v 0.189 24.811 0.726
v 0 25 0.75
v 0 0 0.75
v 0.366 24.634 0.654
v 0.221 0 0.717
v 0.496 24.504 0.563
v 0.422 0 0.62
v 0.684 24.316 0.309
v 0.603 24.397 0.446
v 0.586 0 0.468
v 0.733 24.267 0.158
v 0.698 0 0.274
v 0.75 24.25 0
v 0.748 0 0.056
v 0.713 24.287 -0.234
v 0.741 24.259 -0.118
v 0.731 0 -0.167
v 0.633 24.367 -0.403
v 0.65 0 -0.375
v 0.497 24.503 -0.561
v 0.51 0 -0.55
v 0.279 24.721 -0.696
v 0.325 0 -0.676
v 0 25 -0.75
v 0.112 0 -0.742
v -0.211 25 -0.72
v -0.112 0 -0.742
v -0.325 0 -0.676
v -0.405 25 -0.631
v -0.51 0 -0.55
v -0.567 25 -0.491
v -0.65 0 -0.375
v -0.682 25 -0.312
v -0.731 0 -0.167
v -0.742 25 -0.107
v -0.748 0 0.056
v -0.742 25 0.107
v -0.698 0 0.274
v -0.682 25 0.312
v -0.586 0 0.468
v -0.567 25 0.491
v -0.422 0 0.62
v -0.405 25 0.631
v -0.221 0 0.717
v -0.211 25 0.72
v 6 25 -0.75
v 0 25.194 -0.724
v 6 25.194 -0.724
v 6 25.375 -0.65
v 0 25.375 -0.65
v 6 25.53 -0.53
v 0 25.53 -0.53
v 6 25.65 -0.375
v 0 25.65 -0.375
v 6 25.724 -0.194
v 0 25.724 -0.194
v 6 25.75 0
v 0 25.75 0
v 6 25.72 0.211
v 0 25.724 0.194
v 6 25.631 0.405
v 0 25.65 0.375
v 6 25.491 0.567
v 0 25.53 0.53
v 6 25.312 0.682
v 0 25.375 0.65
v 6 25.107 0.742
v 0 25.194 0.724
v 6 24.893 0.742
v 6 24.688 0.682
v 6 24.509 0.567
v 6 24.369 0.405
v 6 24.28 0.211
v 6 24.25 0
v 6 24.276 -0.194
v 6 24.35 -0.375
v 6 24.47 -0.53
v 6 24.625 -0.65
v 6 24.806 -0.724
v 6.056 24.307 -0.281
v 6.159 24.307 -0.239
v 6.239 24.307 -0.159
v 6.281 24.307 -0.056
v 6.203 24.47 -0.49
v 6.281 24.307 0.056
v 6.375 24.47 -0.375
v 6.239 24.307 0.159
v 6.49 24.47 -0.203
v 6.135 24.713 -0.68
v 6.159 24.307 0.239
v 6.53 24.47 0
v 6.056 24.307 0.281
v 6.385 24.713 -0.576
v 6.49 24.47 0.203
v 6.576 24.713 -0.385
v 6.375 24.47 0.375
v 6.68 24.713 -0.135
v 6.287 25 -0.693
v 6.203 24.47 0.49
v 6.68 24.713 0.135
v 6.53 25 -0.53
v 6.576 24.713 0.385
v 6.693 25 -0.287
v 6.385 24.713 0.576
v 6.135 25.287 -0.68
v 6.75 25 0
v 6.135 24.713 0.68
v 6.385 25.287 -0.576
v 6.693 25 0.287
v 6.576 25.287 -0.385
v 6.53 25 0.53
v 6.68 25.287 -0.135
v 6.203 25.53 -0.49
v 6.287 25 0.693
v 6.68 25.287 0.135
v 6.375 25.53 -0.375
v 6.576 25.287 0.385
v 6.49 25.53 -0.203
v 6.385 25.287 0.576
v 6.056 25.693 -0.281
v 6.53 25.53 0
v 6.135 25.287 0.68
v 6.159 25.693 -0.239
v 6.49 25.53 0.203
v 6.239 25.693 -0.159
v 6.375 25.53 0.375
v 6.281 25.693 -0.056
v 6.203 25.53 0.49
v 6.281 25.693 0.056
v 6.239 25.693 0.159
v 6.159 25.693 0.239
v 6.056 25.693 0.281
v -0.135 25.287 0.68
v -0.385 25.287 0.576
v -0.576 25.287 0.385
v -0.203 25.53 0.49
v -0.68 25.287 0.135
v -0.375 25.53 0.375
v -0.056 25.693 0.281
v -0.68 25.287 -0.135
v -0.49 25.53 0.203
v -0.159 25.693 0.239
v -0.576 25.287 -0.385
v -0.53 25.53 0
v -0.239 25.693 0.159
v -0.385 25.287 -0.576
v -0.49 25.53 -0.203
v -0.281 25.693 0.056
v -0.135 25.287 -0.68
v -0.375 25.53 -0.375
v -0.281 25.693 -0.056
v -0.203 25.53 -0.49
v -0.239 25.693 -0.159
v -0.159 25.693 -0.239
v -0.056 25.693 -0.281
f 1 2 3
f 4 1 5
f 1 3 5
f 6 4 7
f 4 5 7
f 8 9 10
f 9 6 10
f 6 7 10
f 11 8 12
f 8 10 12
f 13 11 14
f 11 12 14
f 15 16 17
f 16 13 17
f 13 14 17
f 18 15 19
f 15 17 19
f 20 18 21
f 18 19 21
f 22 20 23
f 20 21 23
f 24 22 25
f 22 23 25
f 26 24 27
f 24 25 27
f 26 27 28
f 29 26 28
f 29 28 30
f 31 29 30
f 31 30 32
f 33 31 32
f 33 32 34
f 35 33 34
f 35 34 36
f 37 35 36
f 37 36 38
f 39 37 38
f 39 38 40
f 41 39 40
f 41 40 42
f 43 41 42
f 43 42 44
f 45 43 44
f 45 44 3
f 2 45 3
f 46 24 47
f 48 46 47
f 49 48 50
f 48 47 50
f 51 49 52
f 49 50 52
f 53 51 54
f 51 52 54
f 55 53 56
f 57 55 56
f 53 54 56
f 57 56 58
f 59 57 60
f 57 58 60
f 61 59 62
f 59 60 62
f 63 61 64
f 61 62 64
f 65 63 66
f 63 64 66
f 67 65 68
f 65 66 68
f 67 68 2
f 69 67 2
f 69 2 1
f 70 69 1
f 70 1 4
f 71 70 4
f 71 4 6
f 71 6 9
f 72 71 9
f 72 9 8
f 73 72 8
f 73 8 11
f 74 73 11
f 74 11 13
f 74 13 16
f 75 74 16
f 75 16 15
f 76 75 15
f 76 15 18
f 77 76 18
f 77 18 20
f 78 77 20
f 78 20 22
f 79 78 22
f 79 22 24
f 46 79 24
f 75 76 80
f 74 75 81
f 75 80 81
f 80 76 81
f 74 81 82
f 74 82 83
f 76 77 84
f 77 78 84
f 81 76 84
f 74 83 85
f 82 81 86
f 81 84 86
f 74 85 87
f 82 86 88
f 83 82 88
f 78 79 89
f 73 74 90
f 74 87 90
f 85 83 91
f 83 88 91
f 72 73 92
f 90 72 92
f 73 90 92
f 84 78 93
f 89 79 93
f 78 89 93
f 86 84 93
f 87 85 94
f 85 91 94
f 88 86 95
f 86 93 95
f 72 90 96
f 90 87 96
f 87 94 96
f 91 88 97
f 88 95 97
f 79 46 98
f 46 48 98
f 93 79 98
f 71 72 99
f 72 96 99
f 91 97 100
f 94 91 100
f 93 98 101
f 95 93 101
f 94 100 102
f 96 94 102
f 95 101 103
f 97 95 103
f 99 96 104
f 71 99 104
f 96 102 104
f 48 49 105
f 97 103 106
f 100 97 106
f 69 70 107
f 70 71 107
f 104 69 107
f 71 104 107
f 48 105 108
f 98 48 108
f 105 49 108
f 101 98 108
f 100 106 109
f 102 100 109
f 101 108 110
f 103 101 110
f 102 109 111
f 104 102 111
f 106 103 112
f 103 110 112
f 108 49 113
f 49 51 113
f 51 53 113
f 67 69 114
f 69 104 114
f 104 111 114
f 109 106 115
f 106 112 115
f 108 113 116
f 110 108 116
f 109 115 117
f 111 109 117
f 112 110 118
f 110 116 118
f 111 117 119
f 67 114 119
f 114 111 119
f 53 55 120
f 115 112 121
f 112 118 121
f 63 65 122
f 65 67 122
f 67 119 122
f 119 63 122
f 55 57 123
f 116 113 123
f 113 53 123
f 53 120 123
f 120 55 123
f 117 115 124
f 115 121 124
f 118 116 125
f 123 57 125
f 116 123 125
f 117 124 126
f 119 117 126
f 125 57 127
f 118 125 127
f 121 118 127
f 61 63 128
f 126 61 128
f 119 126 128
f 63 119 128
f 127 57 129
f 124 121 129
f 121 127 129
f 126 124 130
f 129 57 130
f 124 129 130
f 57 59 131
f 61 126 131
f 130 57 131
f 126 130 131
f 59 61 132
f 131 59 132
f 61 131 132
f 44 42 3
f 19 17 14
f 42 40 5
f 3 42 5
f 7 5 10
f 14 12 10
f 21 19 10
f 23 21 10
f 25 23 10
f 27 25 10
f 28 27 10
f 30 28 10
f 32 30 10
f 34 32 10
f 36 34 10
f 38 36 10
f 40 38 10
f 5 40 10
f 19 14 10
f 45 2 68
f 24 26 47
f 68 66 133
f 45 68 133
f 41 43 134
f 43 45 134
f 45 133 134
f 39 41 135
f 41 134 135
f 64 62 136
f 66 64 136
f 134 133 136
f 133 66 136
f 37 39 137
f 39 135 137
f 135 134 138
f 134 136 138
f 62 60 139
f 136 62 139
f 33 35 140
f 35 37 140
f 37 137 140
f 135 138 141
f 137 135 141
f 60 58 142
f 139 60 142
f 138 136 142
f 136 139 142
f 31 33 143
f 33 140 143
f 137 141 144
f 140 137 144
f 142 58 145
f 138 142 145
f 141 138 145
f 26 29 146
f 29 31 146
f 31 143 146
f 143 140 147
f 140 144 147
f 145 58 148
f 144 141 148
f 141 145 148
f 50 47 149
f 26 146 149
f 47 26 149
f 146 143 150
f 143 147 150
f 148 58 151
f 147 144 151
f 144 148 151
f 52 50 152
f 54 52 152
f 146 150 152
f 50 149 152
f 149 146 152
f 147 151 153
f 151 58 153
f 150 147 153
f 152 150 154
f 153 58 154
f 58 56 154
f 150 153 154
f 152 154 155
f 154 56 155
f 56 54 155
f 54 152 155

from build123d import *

# Parameters (mm, degrees)
SKETCH_1_R      = 0.75
EXTRUDE_1_DEPTH = 25
SKETCH_3_R      = 0.75
EXTRUDE_2_DEPTH = 6


with BuildPart() as part:
    # 草图1 → 凸台-拉伸1 (new body)
    with BuildSketch(Plane(origin=(0, 0, 0), x_dir=(1, 0, 0), z_dir=(0, 1, 0))):
        with Locations(Location((0, 0, 0), (0, 0, 270))):
            Circle(SKETCH_1_R)
    extrude(amount=EXTRUDE_1_DEPTH)

    # 草图2 → 旋转1 (revolve)
    with BuildSketch(Plane.XY):
        with BuildLine():
            Line((0, 25.75), (0, 24.25))
            ThreePointArc((0, 24.25), (0.75, 25), (0, 25.75))
        make_face()
    revolve(axis=Axis((0, 25.75, 0), (0, -1, 0)))

    # 草图3 → 凸台-拉伸2 (add)
    with BuildSketch(Plane(origin=(0, 0, 0), x_dir=(0, 0, -1), z_dir=(1, 0, 0))):
        with Locations((0, 25)):
            Circle(SKETCH_3_R)
    extrude(amount=EXTRUDE_2_DEPTH)

    # 草图4 → 旋转2 (revolve)
    with BuildSketch(Plane(origin=(6, 0, 0), x_dir=(0, 0, -1), z_dir=(1, 0, 0))):
        with BuildLine():
            Line((0, 25.75), (0, 24.25))
            ThreePointArc((0, 24.25), (0.75, 25), (0, 25.75))
        make_face()
    revolve(axis=Axis((6, 25.75, 0), (0, -1, 0)))


solid = part.part
